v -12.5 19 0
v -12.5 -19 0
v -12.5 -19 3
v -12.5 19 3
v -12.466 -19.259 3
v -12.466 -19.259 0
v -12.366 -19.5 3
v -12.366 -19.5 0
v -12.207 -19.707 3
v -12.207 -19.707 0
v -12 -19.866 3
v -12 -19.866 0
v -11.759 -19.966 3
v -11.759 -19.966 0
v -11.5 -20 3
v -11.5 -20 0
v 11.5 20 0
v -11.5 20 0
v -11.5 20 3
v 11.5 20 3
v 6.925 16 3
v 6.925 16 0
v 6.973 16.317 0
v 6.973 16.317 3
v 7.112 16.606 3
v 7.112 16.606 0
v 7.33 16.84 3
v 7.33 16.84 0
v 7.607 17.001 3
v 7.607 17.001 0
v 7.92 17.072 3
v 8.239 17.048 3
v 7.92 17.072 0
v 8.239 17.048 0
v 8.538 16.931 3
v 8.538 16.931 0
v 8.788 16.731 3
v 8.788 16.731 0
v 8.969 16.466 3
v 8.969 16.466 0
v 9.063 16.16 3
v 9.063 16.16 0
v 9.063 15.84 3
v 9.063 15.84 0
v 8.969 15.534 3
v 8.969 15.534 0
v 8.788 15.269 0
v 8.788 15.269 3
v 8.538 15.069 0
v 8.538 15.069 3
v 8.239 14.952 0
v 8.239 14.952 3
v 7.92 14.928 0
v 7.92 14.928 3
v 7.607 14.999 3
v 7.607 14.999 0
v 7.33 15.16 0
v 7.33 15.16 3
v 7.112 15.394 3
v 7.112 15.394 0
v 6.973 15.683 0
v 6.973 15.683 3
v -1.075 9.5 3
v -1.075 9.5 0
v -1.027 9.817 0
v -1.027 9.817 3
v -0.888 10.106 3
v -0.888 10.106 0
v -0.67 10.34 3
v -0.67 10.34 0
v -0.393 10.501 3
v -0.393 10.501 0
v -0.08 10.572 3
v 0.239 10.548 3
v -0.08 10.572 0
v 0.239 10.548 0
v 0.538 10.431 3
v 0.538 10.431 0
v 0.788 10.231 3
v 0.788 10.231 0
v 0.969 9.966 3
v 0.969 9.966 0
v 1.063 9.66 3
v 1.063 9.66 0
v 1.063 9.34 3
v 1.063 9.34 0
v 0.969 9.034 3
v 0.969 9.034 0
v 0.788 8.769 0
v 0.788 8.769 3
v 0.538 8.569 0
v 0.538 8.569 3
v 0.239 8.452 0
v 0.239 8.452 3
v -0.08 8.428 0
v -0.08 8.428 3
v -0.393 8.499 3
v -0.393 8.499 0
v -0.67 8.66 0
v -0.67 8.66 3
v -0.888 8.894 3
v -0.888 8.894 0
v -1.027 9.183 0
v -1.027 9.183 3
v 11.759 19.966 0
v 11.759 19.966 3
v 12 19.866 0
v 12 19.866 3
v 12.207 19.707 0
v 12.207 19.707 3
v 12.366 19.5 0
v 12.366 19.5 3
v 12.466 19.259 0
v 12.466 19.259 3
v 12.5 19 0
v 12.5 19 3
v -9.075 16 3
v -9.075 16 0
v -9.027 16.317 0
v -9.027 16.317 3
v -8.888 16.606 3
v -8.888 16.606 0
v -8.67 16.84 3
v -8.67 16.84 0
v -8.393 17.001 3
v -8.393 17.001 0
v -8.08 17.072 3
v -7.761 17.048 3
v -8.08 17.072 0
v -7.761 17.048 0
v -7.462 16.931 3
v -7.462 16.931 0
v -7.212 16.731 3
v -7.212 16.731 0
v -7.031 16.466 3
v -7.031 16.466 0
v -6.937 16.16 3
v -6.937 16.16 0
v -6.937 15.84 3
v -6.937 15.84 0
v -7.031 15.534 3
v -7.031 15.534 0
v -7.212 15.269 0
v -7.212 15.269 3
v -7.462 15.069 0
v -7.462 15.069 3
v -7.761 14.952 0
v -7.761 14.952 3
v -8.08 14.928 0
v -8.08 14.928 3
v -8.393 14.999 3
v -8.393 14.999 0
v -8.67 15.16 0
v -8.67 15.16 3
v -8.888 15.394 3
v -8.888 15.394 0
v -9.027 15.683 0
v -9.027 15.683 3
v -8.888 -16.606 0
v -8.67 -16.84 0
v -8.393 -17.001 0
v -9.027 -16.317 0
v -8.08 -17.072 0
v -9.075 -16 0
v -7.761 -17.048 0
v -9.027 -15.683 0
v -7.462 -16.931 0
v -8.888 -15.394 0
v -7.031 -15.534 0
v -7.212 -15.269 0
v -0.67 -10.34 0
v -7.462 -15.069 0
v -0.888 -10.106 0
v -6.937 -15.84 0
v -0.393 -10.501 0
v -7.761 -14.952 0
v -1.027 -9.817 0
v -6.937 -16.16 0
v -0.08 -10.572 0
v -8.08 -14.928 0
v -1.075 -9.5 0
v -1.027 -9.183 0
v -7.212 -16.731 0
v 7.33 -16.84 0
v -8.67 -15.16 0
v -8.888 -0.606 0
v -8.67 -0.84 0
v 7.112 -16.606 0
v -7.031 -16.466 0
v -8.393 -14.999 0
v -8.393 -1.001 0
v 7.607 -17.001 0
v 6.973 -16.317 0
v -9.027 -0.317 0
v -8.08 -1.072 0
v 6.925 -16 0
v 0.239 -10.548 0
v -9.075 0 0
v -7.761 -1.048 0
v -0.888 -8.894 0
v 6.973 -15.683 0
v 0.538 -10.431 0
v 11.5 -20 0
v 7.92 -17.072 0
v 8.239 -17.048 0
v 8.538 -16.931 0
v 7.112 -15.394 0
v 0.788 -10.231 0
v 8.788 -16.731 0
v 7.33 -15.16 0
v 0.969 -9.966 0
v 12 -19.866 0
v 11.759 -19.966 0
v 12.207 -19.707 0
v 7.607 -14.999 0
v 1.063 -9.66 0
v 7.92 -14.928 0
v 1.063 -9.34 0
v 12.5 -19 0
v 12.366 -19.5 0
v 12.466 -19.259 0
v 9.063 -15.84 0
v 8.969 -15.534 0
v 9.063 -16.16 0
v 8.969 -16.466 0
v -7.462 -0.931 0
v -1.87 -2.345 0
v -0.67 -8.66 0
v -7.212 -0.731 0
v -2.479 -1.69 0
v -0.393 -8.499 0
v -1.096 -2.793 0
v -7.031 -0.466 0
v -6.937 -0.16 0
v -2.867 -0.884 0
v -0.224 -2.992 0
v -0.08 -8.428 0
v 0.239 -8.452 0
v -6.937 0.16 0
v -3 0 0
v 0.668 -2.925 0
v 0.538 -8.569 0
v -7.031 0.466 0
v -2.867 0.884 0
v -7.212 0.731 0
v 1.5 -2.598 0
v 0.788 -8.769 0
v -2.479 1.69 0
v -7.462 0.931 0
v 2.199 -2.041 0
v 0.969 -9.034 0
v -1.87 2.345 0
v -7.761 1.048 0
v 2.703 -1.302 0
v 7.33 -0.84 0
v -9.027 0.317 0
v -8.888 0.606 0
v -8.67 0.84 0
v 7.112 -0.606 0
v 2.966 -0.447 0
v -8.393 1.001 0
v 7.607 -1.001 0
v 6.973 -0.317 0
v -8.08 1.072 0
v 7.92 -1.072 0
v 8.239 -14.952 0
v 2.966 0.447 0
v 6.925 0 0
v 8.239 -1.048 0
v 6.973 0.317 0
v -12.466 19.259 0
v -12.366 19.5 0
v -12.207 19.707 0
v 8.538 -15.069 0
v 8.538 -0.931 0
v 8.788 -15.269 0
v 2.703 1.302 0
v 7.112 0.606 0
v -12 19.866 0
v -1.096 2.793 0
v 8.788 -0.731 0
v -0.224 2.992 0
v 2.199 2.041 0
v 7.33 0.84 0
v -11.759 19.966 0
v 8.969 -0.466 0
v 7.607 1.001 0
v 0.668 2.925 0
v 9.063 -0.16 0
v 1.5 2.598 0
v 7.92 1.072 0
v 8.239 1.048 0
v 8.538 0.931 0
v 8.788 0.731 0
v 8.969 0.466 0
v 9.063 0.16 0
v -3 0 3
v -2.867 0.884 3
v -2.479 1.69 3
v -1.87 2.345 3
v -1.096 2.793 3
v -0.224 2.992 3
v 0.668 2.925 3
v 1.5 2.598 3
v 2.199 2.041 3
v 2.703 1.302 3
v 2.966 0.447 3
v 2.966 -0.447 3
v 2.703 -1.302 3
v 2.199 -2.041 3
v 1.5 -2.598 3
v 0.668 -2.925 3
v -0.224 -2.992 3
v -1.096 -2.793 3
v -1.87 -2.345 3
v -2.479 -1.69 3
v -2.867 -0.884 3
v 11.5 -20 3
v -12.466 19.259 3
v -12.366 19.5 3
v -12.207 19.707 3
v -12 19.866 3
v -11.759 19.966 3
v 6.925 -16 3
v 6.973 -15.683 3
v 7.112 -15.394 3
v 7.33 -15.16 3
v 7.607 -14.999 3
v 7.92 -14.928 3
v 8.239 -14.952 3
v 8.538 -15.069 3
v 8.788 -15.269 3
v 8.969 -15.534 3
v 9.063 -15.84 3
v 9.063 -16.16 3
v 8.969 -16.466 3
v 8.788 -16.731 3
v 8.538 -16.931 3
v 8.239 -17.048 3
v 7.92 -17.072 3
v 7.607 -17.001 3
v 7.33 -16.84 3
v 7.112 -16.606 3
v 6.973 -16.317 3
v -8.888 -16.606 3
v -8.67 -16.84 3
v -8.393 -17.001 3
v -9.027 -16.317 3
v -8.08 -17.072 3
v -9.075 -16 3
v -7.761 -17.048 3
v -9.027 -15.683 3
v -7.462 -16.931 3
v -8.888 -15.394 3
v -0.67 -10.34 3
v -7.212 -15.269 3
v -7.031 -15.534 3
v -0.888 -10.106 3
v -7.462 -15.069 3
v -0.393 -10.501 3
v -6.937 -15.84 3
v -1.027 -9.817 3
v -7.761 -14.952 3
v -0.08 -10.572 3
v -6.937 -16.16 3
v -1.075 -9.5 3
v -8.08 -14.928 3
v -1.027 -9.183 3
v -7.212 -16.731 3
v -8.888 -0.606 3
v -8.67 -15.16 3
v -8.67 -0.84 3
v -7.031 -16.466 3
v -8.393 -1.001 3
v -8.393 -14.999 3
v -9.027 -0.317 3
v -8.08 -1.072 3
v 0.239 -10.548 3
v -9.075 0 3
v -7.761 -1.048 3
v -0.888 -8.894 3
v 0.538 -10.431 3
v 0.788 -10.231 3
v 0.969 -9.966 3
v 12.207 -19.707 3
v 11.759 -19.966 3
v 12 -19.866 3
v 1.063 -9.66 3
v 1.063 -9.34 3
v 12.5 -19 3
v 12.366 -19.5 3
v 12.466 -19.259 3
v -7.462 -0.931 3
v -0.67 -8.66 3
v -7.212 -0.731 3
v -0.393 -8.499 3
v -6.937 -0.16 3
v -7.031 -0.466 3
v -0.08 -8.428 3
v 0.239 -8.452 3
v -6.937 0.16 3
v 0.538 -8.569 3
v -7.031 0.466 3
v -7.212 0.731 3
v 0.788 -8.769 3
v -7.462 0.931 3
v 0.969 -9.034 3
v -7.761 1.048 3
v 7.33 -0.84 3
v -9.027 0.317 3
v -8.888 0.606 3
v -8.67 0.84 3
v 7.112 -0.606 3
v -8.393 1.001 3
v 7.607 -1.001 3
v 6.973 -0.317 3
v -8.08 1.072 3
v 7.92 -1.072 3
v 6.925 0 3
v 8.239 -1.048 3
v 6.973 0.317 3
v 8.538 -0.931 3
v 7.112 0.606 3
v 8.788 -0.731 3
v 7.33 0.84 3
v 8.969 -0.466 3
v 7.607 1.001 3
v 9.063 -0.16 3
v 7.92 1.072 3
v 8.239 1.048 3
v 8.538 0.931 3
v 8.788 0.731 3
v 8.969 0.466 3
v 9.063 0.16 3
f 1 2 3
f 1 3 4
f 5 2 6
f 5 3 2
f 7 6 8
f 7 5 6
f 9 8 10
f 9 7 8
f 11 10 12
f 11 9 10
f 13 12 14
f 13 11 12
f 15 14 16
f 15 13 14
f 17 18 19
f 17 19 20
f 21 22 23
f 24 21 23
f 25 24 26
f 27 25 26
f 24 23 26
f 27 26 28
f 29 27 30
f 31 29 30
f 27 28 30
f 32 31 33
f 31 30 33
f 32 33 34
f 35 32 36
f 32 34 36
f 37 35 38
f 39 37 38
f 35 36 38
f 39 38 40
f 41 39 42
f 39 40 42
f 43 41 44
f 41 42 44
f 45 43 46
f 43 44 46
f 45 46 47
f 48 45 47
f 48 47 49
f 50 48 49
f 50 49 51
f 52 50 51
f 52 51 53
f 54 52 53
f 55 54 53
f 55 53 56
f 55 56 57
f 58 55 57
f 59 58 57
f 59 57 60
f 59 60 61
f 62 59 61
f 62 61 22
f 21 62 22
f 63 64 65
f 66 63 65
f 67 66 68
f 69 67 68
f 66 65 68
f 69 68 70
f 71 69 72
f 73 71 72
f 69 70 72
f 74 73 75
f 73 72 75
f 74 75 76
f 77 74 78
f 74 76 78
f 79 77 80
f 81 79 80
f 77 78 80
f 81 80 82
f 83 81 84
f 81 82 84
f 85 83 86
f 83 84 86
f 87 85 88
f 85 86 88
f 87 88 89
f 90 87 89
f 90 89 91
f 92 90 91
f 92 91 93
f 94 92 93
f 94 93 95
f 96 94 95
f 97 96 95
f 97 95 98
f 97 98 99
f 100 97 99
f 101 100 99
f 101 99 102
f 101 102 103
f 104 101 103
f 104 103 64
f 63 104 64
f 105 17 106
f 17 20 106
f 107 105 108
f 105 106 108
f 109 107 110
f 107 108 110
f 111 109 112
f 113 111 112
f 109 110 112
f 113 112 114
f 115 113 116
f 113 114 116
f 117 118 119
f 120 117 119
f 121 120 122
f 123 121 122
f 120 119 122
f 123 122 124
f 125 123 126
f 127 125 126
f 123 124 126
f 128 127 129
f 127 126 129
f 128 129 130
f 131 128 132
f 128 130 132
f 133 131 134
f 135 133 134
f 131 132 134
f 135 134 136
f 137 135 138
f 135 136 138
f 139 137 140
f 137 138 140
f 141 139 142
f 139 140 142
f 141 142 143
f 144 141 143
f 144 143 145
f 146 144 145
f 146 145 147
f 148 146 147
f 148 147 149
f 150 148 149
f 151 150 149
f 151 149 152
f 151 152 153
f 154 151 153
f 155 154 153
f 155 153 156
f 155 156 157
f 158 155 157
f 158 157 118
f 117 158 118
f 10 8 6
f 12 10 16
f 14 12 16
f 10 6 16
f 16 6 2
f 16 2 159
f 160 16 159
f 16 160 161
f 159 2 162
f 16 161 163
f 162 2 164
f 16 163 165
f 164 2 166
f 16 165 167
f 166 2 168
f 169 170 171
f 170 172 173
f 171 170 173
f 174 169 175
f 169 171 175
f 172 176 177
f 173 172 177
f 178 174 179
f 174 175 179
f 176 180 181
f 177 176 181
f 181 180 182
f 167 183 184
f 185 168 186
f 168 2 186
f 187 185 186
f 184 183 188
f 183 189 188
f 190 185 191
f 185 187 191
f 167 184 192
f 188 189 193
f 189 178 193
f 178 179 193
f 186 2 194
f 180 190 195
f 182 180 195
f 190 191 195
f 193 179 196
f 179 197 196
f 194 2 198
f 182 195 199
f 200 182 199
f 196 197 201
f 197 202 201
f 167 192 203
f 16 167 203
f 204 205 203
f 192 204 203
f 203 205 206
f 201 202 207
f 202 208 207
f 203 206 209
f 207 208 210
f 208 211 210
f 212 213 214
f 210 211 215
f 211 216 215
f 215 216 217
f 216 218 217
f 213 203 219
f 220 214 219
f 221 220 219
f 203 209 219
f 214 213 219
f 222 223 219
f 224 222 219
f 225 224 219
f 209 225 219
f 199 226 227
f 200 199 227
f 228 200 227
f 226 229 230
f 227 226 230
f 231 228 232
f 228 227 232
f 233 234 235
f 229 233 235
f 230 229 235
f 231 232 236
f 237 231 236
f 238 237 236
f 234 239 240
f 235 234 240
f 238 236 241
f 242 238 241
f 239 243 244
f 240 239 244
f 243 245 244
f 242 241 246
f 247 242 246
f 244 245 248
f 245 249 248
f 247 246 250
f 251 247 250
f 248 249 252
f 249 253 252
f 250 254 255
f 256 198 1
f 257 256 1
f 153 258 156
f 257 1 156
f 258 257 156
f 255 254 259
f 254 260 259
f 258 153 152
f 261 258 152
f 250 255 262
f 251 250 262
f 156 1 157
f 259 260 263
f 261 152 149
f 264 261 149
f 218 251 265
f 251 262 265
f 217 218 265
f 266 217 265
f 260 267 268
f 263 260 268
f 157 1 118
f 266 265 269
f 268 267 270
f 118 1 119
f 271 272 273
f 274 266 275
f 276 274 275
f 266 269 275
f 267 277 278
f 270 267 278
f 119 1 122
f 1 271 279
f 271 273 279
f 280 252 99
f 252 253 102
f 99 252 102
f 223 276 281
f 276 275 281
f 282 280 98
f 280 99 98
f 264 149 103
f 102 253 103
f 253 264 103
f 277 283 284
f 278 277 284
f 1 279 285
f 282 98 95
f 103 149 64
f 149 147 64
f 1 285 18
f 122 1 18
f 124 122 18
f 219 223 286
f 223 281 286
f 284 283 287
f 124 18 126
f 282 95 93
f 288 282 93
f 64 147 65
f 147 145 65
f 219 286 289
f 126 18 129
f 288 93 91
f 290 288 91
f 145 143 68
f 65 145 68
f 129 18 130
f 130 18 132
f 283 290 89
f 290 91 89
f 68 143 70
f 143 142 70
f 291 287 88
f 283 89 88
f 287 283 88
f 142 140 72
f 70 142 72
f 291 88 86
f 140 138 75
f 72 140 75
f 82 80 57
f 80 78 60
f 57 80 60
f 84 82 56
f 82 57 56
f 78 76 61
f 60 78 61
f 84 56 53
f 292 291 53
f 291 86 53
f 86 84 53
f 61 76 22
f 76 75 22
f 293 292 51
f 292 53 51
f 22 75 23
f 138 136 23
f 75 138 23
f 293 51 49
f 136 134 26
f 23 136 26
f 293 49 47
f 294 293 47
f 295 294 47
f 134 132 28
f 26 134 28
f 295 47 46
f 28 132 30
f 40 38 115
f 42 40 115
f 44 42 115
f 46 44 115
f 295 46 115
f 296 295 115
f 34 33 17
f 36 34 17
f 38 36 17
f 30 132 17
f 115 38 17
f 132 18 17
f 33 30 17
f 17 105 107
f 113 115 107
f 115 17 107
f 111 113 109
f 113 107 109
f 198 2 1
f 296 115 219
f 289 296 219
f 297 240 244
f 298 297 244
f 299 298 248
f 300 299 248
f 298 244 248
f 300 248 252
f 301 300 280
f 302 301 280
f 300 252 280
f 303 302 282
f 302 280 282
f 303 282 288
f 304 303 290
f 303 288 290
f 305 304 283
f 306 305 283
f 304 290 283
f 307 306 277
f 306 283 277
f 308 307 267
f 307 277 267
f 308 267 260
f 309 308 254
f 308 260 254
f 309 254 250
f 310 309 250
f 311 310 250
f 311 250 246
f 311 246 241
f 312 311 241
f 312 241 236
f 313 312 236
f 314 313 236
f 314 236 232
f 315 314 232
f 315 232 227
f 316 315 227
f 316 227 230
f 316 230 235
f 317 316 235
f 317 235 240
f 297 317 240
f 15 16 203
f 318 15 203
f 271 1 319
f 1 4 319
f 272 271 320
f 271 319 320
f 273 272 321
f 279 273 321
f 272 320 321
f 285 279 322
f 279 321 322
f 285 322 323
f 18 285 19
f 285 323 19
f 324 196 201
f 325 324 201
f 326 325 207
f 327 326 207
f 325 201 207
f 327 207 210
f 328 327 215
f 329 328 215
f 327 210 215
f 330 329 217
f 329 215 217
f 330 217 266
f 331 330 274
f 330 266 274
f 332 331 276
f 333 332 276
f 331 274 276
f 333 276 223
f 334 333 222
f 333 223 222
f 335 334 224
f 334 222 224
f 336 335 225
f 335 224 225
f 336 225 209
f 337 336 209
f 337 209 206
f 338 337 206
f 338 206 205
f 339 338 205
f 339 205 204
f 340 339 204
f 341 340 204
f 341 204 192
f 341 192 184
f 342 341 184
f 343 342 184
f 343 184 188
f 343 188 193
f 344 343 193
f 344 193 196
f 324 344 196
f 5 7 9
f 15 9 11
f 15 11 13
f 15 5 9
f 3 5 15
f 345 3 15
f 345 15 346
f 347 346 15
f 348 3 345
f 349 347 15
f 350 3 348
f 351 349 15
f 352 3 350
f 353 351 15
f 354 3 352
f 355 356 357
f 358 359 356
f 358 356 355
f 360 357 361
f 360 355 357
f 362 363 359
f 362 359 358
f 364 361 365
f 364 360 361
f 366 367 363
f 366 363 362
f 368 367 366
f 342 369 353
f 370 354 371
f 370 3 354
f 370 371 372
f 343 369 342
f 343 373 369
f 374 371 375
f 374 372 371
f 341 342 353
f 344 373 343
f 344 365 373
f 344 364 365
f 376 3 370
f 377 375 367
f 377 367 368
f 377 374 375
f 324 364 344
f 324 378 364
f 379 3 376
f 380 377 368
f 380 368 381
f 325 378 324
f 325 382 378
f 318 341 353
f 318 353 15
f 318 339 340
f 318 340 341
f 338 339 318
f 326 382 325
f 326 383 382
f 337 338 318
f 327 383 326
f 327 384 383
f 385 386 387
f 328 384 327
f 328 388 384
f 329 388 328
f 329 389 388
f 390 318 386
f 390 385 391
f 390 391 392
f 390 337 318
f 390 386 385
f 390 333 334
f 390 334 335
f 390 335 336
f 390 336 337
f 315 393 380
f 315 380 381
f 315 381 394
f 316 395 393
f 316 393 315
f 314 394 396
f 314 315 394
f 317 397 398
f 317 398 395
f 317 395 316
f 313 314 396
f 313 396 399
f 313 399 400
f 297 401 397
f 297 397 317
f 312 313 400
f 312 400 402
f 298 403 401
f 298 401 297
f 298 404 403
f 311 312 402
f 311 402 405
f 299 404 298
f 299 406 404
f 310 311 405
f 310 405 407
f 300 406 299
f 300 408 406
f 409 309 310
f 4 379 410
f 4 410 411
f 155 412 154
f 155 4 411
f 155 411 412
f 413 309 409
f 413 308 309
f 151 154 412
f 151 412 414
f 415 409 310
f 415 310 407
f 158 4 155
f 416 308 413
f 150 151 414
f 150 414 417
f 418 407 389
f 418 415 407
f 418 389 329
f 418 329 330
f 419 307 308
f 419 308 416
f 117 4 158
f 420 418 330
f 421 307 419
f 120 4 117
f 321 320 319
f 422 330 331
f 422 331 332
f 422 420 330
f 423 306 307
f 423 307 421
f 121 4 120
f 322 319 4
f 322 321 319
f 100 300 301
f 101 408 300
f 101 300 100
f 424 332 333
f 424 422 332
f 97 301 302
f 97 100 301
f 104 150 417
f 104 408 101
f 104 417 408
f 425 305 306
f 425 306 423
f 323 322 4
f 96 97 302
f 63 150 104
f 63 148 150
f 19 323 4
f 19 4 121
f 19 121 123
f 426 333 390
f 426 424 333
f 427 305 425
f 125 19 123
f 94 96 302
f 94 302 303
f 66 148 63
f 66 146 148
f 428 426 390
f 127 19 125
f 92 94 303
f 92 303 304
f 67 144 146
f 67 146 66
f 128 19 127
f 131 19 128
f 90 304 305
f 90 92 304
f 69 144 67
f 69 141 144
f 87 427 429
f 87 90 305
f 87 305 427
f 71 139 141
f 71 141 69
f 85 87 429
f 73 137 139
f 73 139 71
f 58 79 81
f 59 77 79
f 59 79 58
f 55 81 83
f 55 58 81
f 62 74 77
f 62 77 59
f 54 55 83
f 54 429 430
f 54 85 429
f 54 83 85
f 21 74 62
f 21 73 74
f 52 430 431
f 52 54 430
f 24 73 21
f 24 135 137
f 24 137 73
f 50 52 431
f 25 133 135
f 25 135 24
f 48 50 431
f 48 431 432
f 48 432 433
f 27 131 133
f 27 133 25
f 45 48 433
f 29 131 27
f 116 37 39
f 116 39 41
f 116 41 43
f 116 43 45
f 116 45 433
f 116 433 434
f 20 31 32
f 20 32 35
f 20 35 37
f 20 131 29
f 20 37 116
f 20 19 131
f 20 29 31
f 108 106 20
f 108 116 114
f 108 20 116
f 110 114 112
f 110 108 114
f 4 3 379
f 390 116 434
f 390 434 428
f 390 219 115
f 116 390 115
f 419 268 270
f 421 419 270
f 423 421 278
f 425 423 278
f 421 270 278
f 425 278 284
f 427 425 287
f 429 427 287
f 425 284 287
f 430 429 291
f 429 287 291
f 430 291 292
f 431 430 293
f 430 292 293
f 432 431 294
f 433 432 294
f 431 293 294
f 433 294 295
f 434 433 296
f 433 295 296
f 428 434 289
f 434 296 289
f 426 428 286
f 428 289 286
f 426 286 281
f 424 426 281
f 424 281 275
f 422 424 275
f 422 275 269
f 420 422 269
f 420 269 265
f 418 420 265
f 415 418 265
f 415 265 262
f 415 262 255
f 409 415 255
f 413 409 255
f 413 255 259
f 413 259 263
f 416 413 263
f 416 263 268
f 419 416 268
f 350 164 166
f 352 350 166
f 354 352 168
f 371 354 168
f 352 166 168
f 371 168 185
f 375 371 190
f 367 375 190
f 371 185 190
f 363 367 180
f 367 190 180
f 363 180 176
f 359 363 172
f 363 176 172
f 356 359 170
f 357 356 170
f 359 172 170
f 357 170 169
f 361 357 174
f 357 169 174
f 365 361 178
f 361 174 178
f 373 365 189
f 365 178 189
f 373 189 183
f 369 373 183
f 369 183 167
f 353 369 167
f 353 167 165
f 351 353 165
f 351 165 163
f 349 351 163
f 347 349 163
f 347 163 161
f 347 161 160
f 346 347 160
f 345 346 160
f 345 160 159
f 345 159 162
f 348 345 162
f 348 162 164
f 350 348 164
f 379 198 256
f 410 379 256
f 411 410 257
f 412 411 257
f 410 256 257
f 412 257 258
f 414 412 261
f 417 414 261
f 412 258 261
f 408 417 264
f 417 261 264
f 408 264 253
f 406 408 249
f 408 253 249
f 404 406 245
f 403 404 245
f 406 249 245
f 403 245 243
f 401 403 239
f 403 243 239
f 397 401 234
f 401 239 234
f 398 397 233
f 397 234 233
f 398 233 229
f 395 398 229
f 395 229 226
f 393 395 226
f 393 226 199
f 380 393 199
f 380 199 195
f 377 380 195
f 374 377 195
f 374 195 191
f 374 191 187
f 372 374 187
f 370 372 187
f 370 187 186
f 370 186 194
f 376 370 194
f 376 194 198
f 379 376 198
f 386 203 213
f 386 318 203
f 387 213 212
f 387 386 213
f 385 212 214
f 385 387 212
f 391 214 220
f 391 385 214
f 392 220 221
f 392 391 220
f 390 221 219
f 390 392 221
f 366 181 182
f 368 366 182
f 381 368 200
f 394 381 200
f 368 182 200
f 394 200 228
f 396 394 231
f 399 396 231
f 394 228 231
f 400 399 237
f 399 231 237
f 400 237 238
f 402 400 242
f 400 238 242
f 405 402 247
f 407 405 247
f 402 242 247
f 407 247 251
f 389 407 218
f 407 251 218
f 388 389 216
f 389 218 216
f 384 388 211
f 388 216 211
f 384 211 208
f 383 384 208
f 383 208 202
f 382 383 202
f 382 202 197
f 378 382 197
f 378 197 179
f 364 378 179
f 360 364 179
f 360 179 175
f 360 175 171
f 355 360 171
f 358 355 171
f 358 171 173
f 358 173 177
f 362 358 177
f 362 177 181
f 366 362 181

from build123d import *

# Parameters (mm, degrees)
F0_W     = 25
F0_H     = 40
F1_DEPTH = 3
F3_D     = 2.15
F4_R     = 1
F6_D     = 6
F6_DEPTH = 4.05
F6_TIP   = 1.8025818571


with BuildPart() as f1:
    # F0 (on Top) → F1 (new body)
    with BuildSketch(Plane.XY):
        Rectangle(F0_W, F0_H)
    extrude(amount=F1_DEPTH)

    # F3 (through all)
    with Locations(Plane.XY.offset(3)):
        with Locations((0, 9.5), (0, -9.5), (8, 0), (-8, 0), (8, 16), (-8, 16), (-8, -16), (8, -16)):
            Hole(F3_D / 2)

    # F4
    f4_edges = [f1.edges().sort_by_distance(p)[0] for p in [
        (12.5, -20, 1.5),
        (-12.5, -20, 1.5),
        (12.5, 20, 1.5),
        (-12.5, 20, 1.5),
    ]]
    fillet(f4_edges, radius=F4_R)

    # F6
    with Locations(Plane.XY.offset(3)):
        with Locations((0, 0)):
            Hole(F6_D / 2, depth=F6_DEPTH)
            with Locations((0, 0, -(F6_DEPTH + F6_TIP / 2))):  # 118° drill point
                Cone(0, F6_D / 2, F6_TIP, mode=Mode.SUBTRACT)


solid = f1.part
